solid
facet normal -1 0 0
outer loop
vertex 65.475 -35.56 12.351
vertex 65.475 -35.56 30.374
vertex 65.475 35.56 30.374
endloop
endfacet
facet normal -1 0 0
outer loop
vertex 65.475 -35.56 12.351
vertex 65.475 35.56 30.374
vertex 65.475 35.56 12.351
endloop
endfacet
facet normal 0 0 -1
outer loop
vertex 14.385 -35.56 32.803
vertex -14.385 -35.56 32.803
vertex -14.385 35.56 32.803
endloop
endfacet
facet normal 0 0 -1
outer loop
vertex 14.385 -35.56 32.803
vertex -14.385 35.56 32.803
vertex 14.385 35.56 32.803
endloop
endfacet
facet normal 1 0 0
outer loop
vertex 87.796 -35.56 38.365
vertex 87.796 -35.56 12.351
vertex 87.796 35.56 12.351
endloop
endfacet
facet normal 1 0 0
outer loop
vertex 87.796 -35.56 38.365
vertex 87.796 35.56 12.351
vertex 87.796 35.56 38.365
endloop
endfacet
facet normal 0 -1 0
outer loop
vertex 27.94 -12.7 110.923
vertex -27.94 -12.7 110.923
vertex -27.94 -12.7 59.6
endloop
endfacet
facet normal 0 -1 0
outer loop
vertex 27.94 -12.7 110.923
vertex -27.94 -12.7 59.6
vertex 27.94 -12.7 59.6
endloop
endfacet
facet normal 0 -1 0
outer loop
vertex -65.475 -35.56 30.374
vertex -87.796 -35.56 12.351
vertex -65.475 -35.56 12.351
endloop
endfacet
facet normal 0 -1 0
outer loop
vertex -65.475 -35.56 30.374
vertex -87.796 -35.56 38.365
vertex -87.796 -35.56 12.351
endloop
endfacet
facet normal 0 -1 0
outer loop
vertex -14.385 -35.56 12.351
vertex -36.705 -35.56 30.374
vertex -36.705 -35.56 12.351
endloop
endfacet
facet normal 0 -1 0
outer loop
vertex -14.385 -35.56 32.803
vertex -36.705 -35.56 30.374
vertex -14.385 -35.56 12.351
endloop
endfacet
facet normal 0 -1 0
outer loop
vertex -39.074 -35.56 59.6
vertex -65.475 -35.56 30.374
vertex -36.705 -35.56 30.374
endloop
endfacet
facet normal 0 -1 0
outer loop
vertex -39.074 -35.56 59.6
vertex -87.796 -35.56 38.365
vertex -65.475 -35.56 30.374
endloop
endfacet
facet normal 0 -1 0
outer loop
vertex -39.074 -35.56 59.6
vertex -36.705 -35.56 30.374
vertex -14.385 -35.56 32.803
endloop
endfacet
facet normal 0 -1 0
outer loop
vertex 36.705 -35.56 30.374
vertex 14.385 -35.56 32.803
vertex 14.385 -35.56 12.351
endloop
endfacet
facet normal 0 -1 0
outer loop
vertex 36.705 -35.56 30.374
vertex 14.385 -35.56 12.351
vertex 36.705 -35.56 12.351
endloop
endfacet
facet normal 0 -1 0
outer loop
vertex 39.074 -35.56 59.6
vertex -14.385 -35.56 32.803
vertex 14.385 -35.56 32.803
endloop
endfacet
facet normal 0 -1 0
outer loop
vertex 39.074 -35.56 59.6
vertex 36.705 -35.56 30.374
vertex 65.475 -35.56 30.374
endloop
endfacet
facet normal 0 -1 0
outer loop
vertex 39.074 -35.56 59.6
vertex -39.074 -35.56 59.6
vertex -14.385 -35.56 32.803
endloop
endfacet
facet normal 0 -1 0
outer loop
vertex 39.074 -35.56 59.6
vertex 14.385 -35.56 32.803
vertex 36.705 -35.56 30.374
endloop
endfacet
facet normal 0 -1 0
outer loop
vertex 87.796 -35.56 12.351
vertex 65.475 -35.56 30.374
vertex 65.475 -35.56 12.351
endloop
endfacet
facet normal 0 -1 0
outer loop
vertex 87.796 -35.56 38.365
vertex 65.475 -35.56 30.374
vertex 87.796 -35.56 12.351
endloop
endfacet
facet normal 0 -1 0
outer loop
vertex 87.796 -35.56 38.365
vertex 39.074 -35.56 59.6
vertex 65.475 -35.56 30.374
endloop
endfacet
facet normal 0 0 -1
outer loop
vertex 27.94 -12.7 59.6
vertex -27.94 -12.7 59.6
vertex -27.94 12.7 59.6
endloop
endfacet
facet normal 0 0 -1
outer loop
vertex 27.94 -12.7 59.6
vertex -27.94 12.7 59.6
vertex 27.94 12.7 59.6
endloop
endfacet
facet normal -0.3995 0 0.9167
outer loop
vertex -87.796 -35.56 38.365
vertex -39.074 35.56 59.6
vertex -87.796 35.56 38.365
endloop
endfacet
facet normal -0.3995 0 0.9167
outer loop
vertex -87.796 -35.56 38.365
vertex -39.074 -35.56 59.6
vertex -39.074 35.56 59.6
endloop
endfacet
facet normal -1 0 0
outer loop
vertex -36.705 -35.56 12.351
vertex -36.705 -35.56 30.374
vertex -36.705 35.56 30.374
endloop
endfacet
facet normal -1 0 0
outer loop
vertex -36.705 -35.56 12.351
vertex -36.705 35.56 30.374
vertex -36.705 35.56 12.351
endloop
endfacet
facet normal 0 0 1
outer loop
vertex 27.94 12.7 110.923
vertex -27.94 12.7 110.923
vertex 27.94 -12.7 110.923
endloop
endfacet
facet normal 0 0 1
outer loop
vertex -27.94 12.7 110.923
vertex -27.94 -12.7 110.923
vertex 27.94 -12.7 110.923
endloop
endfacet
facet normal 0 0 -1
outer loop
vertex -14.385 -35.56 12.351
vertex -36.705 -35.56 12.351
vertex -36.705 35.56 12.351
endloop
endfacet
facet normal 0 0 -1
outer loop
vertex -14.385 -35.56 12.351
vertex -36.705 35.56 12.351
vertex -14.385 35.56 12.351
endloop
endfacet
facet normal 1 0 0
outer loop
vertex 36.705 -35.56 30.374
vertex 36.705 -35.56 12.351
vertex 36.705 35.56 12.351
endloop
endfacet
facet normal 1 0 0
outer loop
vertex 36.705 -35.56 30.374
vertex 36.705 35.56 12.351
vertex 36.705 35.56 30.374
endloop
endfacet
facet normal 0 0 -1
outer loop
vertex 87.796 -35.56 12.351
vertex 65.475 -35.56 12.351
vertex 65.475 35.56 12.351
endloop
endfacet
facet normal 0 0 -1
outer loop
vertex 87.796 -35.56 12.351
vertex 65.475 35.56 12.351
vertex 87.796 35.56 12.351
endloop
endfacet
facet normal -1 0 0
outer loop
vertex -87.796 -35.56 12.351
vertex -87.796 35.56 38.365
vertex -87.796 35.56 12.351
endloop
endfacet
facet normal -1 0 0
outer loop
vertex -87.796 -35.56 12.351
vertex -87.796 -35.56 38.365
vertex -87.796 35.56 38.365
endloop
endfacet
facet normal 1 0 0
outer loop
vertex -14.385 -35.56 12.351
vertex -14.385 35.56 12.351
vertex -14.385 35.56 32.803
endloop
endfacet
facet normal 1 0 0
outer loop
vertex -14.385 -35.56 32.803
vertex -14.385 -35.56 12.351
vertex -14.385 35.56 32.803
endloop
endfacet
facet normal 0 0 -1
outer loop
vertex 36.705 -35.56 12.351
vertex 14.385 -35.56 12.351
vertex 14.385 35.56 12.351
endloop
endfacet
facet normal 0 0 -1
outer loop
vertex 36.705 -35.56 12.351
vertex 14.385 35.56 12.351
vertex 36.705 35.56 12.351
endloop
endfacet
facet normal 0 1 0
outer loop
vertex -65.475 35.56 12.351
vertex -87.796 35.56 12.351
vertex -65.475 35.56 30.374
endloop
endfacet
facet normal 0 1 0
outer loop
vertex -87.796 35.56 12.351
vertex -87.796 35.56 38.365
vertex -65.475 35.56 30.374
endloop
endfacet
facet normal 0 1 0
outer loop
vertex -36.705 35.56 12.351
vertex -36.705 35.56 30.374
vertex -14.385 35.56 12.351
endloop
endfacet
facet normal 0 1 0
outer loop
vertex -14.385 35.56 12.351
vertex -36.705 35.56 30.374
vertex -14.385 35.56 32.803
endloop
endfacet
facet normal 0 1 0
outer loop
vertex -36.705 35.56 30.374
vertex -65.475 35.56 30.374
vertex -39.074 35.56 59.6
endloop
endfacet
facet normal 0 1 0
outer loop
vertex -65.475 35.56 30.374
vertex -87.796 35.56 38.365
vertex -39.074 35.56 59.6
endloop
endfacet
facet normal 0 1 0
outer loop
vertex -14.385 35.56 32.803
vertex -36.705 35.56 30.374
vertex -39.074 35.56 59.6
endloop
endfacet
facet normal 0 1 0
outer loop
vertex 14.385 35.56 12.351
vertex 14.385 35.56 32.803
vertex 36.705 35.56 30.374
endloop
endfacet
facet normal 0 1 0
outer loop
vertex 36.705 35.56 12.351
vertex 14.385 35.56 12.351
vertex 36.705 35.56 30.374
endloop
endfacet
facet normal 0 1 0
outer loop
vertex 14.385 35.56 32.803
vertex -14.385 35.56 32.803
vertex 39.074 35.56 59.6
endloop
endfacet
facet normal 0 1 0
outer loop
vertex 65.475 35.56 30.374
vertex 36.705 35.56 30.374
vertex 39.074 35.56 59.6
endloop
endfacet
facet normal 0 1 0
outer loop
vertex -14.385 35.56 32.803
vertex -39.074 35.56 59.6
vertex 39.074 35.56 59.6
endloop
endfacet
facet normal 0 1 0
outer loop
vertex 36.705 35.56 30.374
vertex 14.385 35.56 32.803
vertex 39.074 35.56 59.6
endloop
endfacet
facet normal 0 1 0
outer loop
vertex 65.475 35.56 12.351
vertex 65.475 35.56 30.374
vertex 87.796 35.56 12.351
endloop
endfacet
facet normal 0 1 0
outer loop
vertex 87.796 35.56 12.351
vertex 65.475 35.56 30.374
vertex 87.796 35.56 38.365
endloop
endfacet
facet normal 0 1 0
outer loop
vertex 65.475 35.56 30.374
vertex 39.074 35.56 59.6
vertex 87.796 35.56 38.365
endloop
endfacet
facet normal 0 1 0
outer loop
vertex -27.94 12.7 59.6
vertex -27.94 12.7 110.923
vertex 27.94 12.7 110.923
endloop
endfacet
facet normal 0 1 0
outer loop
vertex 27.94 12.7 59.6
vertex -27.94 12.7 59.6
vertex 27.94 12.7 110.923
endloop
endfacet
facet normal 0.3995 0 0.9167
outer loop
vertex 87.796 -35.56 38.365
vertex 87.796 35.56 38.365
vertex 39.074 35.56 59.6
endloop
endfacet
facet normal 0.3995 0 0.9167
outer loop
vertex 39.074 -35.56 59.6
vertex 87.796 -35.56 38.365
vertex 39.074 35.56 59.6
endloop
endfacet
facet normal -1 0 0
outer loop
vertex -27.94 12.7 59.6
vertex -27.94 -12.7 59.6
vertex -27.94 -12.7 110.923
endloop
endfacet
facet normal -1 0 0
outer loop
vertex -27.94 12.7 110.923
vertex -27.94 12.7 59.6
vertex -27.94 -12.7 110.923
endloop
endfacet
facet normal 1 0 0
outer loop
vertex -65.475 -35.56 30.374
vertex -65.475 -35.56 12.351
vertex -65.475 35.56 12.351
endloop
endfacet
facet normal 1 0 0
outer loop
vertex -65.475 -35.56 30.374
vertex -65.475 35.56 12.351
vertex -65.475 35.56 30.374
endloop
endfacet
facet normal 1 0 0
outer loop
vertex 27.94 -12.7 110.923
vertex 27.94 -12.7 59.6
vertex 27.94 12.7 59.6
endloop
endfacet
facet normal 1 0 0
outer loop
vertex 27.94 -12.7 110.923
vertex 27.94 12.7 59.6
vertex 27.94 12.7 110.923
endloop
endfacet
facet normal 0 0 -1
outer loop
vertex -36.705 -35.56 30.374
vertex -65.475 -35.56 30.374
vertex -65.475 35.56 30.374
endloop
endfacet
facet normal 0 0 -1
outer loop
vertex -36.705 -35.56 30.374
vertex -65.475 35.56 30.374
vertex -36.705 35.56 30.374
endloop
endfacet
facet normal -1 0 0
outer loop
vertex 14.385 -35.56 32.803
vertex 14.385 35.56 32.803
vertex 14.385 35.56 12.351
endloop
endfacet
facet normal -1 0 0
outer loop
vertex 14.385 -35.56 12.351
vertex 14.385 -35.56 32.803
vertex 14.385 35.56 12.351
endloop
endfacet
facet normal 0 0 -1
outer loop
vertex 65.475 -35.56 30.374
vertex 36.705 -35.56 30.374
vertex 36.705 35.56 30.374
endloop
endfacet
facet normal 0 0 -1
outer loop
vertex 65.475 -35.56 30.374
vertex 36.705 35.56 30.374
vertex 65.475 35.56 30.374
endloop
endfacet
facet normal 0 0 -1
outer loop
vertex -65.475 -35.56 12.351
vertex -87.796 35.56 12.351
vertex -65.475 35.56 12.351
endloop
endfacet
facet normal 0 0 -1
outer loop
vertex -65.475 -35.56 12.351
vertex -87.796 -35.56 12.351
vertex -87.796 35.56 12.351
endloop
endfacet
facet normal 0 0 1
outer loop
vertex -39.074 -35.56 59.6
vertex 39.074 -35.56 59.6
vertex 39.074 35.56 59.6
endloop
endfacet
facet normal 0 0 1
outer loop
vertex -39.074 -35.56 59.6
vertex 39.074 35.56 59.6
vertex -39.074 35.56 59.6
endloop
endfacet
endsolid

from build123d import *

# Parameters (mm, degrees)
F1_DEPTH = 35.56
F2_W     = 55.88
F2_H     = 51.323274
F3_DEPTH = 12.7


with BuildPart() as f1:
    # F0 (on Front) → F1 (new body, symmetric)
    with BuildSketch(Plane.XZ):
        Polygon((-87.795595, 12.35097), (-65.474896, 12.35097), (-65.474896, 30.374324), (-36.705431, 30.374324), (-36.705431, 12.35097), (-14.384733, 12.35097), (-14.384733, 32.803118), (14.384733, 32.803118), (14.384733, 12.35097), (36.705431, 12.35097), (36.705431, 30.374324), (65.474896, 30.374324), (65.474896, 12.35097), (87.795595, 12.35097), (87.795595, 38.365485), (39.074105, 59.600096), (0, 59.600096), (-39.074105, 59.600096), (-87.795595, 38.365485), align=None)
    extrude(amount=F1_DEPTH, both=True)


with BuildPart() as f3:
    # F2 (on Front) → F3 (new body, symmetric)
    with BuildSketch(Plane.XZ):
        with Locations((0, 85.261733)):
            Rectangle(F2_W, F2_H)
    extrude(amount=F3_DEPTH, both=True)


solid = Compound([f1.part, f3.part])
